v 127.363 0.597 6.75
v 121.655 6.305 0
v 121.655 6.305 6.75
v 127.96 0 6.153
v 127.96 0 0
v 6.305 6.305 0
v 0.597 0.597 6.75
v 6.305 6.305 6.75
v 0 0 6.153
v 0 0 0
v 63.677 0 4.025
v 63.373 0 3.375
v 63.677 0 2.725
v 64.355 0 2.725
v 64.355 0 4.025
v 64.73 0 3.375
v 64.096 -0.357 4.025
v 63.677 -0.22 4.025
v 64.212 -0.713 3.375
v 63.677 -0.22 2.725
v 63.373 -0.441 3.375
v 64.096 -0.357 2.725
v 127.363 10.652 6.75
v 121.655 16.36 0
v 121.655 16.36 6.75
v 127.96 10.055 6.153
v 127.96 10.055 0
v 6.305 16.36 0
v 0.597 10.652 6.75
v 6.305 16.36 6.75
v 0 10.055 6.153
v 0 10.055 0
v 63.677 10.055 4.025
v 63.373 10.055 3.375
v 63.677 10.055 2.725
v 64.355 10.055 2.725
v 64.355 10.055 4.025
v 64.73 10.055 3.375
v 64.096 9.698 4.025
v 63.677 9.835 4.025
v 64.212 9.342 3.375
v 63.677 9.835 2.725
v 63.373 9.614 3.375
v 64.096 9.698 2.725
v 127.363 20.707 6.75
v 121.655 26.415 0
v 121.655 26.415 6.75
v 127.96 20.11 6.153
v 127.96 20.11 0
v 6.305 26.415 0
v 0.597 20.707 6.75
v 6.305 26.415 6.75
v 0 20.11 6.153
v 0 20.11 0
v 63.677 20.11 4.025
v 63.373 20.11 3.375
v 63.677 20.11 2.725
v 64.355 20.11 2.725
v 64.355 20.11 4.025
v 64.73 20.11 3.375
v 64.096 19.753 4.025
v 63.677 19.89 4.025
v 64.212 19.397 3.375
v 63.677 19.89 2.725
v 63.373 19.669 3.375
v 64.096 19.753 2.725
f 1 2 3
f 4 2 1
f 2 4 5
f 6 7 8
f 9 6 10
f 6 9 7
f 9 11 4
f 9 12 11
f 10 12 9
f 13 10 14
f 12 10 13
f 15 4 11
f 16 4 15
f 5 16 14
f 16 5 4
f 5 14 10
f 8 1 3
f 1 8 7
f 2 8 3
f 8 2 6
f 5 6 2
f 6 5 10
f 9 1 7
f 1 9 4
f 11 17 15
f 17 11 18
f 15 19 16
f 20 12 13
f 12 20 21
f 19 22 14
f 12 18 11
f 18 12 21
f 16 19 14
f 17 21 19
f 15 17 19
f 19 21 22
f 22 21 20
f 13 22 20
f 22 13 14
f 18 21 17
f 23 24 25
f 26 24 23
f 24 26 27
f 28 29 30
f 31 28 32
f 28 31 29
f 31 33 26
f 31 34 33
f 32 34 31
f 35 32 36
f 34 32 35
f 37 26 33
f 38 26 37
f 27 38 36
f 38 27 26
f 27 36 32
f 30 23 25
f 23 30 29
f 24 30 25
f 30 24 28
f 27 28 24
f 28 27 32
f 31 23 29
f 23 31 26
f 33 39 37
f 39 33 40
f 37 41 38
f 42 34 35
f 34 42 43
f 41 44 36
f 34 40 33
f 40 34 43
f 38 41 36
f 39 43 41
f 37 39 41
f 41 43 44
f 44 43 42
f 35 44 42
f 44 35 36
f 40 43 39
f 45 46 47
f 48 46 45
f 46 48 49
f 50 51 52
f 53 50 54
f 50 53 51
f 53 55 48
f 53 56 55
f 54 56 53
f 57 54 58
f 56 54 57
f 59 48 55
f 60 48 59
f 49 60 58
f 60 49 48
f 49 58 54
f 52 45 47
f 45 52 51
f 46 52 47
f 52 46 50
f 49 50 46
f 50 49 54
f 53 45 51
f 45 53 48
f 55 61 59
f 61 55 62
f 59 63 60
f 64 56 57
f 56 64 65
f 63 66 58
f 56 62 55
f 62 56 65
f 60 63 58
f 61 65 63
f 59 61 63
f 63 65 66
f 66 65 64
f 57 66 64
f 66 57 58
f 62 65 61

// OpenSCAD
// file: sharedparams.scad
// Total outside dimensions of box plus lid; width, depth, height
boxSize = [150, 150, 80];

// Radius of the top section of the pins
pinBottomRadius = boxSize[0] / 50;

// Radius of the top section of the pins
pinTopRadius = pinBottomRadius * 0.625;

// Distance between centers of holes
holeSpacing = pinBottomRadius * 4;

// Thickness of the top surface of the lid.
lidTopThick = 3;

// Thickness of the wall of the top section of the box.
boxTopThick = 3;

// Thickness of the wall of the sides of the lid
lidSideThick = 2;

// Height of the upper section of the box.
boxTopSectionHeight = 30;

// Total outside dimensions of the lid
lidSize = [boxSize[0], boxSize[1], boxTopSectionHeight + lidTopThick];

// Offset from top of the lid to top of the button
buttonTopOffset = 15;

// Amount of clearance between the sliding button and button hole in the lid, on each side in vertical direction
lidButtonSlotClearanceZ = 0.5;

// Distance from bottom of lid to bottom of slot for button
boxKeywayOffsetZ = lidSize[2] - buttonTopOffset;

// Width of the button in the front
buttonWidth = 4;

// Amount of space to leave between the button arm and keyway slot, on each side
keywayClearanceX = 0.5;

// Width of the box keyway slot (narrow part)
boxKeywayWidth = buttonWidth + 2 * keywayClearanceX;

// Width of box key slot (thick part)
boxKeyholeWidth = boxKeywayWidth * 2;

// Amount of space to leave between button and keyhole, on each side
keyholeClearanceZ = 0.5;

// Clearance to leave between inner sides of lid and outer sides of the top of the box, on each side
lidSideBoxClearance = 1.5;

// Thickness of the sliding plate
slidePlateThick = 3;

// amount of clearance to leave between inside workings and box
// clearance to sides in built into lidSideThick
boxInsideClearance = 1;

// This is the offset from the origin (either X or Y) to where the inner workings of
// the lid can start.  It includes necessary clearances to fit the lid on the box.
innerLidPartsOffset = lidSideThick + lidSideBoxClearance + boxTopThick + boxInsideClearance;

// Radius of the holes in the lid
topHoleRadius = pinTopRadius + 0.5;

// How many holes
holeGridSizeX = 9;
holeGridSizeY = 9;

// The offset from the XY origin of the lid to the center of the nearest hole
holeGridPosX = (lidSize[0] - (holeGridSizeX - 1) * holeSpacing) / 2;
holeGridPosY = (lidSize[1] - (holeGridSizeY - 1) * holeSpacing) / 2;

// Distance (radius) of clearance from rotating pin to parts
pinRotateClearance = 1;

// Amount added to pin bottom diameter to get the diameter of slide plate holes
slidePlatePinClearance = 0.8;

// Width of border around edges of holes in sliding plate
slidePlateBorderSize = 5;

// Width of the sliding plate
slidePlateWidth = (holeGridSizeX - 1) * holeSpacing + 2 * (pinBottomRadius + slidePlatePinClearance + slidePlateBorderSize);

// Offset from the top of lid to near side of sliding plate
slidePlateTopOffset = buttonTopOffset;

// Thickness of just base plate base sheet
basePlateThick = 3;

// Height of the detent prongs
detentProngHeight = 2;

// Offset from the top of the base plate to the Z center of the detent prong
basePlateDetentProngOffsetZ = 5;

// thickness of base plate including needed mechanisms
basePlateTotalThick = basePlateThick + basePlateDetentProngOffsetZ + detentProngHeight + 3;

// Distance from top of base plate mechanisms to bottom of slide plate
slidePlateToBaseClearance  = 3;

// Distance from the top of the lid to the top of the base plate base (ie, the top of the plate, not including mechanisms)
basePlateBaseTopOffset = slidePlateTopOffset + slidePlateThick + slidePlateToBaseClearance + basePlateTotalThick - basePlateThick;

// Amount the notch protrudes into the pin from the farthest point on the circumference
pinNotchDepth = pinBottomRadius * 2 * 0.65;

// Depth of the sliding plate
slidePlateDepth = lidSize[1] - 2 * (lidSideThick + lidSideBoxClearance + boxTopThick + boxInsideClearance) - pinNotchDepth * 1.25;

// Width of the notch in pins
pinNotchWidth = pinBottomRadius * 0.8;

// Amount of clearance between the prongs and pin notches on each side of the notch
pinNotchClearance = 0.4;

// Amount of space to leave between pins and prongs in locked state
prongLengthClearance = 1;

// Amount of clearance to leave for pressing the button to unlock the box.
// ie, the distance the button travels past the point where it unlocks the box.
buttonPressClearance = 0.5;

// The minimum amount the buttons extends in the unlocked (pushed) position
buttonMinExtension = 5;

// Vertical clearance between slides for sliding plate
slidePlateVerticalClearance = 1.5;

// Radius of the pivot hole in the bottom of the pin
pinBottomCavityRadius = pinBottomRadius - 1;

// Height of pin bottom cavity
pinBottomCavityHeight = 3;

// Length of the bottom cavity key notch
fixedPosKeyWidth = (pinBottomRadius - pinBottomCavityRadius) * 0.8;

 // Width of the support post for the detent prongs
detentPostWidth = pinBottomRadius * 2;

// Depth/thickness of the support post for the detent prongs
detentPostDepth = 2.5;

// Distance from the detent post to the outside of the pin cylinder (not counting the bit that protrudes inside the cylinder
detentProngLength = 3.5;

slideWidth = holeGridPosX - pinBottomRadius - pinRotateClearance - innerLidPartsOffset;
slideHeight = slidePlateTopOffset - lidTopThick;
slideDepth = lidSize[1] - 2 * innerLidPartsOffset;

slidePosY = innerLidPartsOffset;
slidePosZ = lidSize[2] - slideHeight - lidTopThick;
slide1PosX = innerLidPartsOffset;
slide2PosX = lidSize[0] - innerLidPartsOffset - slideWidth;

sideSlideClearance = 1;

sideSlideWidth = (lidSize[0] - slidePlateWidth) / 2 - slide1PosX - sideSlideClearance;
sideSlideHeight = slidePlateThick;
sideSlidePosZ = slidePosZ - sideSlideHeight;

postWidth = sideSlideWidth;
postDepth = slideDepth / 10;
postHeight = basePlateBaseTopOffset - (lidSize[2] - sideSlidePosZ);

fastenerPegDepth = postDepth / 2;
fastenerSlotThroat = postWidth * 0.65;

pinBottomCavityClearance = 0.5;

clipBallRadius = 0.75;
// main file
include <sharedparams.scad>

clipBottomLengthClearance = 0.25;
clipBottomLength = slide2PosX - slide1PosX + slideWidth - (postWidth - fastenerSlotThroat) * 2 - clipBottomLengthClearance;
clipHeight = fastenerSlotThroat;
clipDepth = fastenerPegDepth;
ballRadius = clipBallRadius;
chamfer = clipDepth / 8;

module clip() {
    difference() {
        // Body of clip
        linear_extrude(clipDepth)
            polygon([
                [0, 0],
                [clipBottomLength, 0],
                [clipBottomLength - clipHeight, clipHeight],
                [clipHeight, clipHeight]
            ]);
        // Chamfer on one side
        translate([clipBottomLength/2, 0, clipDepth])
            rotate([45, 0, 0])
                cube([clipBottomLength, chamfer, chamfer], center=true);
    };
    // Half sphere in bottom
    translate([clipBottomLength / 2, 0, clipDepth / 2])
        sphere(r=ballRadius);
};

numClips = 3;

for (i = [1 : 3])
    translate([0, (i-1) * (clipHeight + ballRadius + 3)])
        clip();
